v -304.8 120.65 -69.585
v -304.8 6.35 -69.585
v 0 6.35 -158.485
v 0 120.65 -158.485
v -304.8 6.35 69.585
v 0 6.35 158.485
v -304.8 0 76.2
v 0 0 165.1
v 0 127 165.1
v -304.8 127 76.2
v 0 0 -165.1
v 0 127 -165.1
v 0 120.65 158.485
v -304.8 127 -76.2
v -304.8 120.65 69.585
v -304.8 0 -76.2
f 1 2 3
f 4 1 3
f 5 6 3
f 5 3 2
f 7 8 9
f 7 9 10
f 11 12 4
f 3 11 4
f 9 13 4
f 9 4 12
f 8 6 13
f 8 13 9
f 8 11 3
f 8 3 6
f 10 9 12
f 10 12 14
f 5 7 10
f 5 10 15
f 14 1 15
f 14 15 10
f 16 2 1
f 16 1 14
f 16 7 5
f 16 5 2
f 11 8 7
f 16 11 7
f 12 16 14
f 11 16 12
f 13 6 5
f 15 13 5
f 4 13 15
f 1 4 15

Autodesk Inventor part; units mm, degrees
ref_plane "YZ Plane" through (0, 0, 0) normal (1, 0, 0) x (0, 1, 0)
ref_plane "XZ Plane" through (0, 0, 0) normal (0, 1, 0) x (-1, 0, 0)
ref_plane "XY Plane" through (0, 0, 0) normal (0, 0, 1) x (1, 0, 0)
sketch "Sketch1" plane through (0, 0, 0) normal (0, 1, 0) x (-1, 0, 0)
  line L0 (0, 165.1) -> (304.8, 76.2)
  line L1 (304.8, 76.2) -> (304.8, -76.2)
  line L2 (304.8, -76.2) -> (0, -165.1)
  line L3 (0, -165.1) -> (0, 165.1)
  point P0 (0, 0)
  point P1 (304.8, 0)
  point P2 (0, 0)
  dimension "d0" = 330.2
  dimension "d1" = 152.4
  dimension "d2" = 304.8
extrude "Extrusion1" add sketch "Sketch1" along normal blind 127
shell "Shell1" thickness 6.35 removed faces 2 at (0, 42.3333, 55.0333) at (-304.8, 42.3333, -25.4)
properties part number "feeder block" material "Aluminum 6061"
